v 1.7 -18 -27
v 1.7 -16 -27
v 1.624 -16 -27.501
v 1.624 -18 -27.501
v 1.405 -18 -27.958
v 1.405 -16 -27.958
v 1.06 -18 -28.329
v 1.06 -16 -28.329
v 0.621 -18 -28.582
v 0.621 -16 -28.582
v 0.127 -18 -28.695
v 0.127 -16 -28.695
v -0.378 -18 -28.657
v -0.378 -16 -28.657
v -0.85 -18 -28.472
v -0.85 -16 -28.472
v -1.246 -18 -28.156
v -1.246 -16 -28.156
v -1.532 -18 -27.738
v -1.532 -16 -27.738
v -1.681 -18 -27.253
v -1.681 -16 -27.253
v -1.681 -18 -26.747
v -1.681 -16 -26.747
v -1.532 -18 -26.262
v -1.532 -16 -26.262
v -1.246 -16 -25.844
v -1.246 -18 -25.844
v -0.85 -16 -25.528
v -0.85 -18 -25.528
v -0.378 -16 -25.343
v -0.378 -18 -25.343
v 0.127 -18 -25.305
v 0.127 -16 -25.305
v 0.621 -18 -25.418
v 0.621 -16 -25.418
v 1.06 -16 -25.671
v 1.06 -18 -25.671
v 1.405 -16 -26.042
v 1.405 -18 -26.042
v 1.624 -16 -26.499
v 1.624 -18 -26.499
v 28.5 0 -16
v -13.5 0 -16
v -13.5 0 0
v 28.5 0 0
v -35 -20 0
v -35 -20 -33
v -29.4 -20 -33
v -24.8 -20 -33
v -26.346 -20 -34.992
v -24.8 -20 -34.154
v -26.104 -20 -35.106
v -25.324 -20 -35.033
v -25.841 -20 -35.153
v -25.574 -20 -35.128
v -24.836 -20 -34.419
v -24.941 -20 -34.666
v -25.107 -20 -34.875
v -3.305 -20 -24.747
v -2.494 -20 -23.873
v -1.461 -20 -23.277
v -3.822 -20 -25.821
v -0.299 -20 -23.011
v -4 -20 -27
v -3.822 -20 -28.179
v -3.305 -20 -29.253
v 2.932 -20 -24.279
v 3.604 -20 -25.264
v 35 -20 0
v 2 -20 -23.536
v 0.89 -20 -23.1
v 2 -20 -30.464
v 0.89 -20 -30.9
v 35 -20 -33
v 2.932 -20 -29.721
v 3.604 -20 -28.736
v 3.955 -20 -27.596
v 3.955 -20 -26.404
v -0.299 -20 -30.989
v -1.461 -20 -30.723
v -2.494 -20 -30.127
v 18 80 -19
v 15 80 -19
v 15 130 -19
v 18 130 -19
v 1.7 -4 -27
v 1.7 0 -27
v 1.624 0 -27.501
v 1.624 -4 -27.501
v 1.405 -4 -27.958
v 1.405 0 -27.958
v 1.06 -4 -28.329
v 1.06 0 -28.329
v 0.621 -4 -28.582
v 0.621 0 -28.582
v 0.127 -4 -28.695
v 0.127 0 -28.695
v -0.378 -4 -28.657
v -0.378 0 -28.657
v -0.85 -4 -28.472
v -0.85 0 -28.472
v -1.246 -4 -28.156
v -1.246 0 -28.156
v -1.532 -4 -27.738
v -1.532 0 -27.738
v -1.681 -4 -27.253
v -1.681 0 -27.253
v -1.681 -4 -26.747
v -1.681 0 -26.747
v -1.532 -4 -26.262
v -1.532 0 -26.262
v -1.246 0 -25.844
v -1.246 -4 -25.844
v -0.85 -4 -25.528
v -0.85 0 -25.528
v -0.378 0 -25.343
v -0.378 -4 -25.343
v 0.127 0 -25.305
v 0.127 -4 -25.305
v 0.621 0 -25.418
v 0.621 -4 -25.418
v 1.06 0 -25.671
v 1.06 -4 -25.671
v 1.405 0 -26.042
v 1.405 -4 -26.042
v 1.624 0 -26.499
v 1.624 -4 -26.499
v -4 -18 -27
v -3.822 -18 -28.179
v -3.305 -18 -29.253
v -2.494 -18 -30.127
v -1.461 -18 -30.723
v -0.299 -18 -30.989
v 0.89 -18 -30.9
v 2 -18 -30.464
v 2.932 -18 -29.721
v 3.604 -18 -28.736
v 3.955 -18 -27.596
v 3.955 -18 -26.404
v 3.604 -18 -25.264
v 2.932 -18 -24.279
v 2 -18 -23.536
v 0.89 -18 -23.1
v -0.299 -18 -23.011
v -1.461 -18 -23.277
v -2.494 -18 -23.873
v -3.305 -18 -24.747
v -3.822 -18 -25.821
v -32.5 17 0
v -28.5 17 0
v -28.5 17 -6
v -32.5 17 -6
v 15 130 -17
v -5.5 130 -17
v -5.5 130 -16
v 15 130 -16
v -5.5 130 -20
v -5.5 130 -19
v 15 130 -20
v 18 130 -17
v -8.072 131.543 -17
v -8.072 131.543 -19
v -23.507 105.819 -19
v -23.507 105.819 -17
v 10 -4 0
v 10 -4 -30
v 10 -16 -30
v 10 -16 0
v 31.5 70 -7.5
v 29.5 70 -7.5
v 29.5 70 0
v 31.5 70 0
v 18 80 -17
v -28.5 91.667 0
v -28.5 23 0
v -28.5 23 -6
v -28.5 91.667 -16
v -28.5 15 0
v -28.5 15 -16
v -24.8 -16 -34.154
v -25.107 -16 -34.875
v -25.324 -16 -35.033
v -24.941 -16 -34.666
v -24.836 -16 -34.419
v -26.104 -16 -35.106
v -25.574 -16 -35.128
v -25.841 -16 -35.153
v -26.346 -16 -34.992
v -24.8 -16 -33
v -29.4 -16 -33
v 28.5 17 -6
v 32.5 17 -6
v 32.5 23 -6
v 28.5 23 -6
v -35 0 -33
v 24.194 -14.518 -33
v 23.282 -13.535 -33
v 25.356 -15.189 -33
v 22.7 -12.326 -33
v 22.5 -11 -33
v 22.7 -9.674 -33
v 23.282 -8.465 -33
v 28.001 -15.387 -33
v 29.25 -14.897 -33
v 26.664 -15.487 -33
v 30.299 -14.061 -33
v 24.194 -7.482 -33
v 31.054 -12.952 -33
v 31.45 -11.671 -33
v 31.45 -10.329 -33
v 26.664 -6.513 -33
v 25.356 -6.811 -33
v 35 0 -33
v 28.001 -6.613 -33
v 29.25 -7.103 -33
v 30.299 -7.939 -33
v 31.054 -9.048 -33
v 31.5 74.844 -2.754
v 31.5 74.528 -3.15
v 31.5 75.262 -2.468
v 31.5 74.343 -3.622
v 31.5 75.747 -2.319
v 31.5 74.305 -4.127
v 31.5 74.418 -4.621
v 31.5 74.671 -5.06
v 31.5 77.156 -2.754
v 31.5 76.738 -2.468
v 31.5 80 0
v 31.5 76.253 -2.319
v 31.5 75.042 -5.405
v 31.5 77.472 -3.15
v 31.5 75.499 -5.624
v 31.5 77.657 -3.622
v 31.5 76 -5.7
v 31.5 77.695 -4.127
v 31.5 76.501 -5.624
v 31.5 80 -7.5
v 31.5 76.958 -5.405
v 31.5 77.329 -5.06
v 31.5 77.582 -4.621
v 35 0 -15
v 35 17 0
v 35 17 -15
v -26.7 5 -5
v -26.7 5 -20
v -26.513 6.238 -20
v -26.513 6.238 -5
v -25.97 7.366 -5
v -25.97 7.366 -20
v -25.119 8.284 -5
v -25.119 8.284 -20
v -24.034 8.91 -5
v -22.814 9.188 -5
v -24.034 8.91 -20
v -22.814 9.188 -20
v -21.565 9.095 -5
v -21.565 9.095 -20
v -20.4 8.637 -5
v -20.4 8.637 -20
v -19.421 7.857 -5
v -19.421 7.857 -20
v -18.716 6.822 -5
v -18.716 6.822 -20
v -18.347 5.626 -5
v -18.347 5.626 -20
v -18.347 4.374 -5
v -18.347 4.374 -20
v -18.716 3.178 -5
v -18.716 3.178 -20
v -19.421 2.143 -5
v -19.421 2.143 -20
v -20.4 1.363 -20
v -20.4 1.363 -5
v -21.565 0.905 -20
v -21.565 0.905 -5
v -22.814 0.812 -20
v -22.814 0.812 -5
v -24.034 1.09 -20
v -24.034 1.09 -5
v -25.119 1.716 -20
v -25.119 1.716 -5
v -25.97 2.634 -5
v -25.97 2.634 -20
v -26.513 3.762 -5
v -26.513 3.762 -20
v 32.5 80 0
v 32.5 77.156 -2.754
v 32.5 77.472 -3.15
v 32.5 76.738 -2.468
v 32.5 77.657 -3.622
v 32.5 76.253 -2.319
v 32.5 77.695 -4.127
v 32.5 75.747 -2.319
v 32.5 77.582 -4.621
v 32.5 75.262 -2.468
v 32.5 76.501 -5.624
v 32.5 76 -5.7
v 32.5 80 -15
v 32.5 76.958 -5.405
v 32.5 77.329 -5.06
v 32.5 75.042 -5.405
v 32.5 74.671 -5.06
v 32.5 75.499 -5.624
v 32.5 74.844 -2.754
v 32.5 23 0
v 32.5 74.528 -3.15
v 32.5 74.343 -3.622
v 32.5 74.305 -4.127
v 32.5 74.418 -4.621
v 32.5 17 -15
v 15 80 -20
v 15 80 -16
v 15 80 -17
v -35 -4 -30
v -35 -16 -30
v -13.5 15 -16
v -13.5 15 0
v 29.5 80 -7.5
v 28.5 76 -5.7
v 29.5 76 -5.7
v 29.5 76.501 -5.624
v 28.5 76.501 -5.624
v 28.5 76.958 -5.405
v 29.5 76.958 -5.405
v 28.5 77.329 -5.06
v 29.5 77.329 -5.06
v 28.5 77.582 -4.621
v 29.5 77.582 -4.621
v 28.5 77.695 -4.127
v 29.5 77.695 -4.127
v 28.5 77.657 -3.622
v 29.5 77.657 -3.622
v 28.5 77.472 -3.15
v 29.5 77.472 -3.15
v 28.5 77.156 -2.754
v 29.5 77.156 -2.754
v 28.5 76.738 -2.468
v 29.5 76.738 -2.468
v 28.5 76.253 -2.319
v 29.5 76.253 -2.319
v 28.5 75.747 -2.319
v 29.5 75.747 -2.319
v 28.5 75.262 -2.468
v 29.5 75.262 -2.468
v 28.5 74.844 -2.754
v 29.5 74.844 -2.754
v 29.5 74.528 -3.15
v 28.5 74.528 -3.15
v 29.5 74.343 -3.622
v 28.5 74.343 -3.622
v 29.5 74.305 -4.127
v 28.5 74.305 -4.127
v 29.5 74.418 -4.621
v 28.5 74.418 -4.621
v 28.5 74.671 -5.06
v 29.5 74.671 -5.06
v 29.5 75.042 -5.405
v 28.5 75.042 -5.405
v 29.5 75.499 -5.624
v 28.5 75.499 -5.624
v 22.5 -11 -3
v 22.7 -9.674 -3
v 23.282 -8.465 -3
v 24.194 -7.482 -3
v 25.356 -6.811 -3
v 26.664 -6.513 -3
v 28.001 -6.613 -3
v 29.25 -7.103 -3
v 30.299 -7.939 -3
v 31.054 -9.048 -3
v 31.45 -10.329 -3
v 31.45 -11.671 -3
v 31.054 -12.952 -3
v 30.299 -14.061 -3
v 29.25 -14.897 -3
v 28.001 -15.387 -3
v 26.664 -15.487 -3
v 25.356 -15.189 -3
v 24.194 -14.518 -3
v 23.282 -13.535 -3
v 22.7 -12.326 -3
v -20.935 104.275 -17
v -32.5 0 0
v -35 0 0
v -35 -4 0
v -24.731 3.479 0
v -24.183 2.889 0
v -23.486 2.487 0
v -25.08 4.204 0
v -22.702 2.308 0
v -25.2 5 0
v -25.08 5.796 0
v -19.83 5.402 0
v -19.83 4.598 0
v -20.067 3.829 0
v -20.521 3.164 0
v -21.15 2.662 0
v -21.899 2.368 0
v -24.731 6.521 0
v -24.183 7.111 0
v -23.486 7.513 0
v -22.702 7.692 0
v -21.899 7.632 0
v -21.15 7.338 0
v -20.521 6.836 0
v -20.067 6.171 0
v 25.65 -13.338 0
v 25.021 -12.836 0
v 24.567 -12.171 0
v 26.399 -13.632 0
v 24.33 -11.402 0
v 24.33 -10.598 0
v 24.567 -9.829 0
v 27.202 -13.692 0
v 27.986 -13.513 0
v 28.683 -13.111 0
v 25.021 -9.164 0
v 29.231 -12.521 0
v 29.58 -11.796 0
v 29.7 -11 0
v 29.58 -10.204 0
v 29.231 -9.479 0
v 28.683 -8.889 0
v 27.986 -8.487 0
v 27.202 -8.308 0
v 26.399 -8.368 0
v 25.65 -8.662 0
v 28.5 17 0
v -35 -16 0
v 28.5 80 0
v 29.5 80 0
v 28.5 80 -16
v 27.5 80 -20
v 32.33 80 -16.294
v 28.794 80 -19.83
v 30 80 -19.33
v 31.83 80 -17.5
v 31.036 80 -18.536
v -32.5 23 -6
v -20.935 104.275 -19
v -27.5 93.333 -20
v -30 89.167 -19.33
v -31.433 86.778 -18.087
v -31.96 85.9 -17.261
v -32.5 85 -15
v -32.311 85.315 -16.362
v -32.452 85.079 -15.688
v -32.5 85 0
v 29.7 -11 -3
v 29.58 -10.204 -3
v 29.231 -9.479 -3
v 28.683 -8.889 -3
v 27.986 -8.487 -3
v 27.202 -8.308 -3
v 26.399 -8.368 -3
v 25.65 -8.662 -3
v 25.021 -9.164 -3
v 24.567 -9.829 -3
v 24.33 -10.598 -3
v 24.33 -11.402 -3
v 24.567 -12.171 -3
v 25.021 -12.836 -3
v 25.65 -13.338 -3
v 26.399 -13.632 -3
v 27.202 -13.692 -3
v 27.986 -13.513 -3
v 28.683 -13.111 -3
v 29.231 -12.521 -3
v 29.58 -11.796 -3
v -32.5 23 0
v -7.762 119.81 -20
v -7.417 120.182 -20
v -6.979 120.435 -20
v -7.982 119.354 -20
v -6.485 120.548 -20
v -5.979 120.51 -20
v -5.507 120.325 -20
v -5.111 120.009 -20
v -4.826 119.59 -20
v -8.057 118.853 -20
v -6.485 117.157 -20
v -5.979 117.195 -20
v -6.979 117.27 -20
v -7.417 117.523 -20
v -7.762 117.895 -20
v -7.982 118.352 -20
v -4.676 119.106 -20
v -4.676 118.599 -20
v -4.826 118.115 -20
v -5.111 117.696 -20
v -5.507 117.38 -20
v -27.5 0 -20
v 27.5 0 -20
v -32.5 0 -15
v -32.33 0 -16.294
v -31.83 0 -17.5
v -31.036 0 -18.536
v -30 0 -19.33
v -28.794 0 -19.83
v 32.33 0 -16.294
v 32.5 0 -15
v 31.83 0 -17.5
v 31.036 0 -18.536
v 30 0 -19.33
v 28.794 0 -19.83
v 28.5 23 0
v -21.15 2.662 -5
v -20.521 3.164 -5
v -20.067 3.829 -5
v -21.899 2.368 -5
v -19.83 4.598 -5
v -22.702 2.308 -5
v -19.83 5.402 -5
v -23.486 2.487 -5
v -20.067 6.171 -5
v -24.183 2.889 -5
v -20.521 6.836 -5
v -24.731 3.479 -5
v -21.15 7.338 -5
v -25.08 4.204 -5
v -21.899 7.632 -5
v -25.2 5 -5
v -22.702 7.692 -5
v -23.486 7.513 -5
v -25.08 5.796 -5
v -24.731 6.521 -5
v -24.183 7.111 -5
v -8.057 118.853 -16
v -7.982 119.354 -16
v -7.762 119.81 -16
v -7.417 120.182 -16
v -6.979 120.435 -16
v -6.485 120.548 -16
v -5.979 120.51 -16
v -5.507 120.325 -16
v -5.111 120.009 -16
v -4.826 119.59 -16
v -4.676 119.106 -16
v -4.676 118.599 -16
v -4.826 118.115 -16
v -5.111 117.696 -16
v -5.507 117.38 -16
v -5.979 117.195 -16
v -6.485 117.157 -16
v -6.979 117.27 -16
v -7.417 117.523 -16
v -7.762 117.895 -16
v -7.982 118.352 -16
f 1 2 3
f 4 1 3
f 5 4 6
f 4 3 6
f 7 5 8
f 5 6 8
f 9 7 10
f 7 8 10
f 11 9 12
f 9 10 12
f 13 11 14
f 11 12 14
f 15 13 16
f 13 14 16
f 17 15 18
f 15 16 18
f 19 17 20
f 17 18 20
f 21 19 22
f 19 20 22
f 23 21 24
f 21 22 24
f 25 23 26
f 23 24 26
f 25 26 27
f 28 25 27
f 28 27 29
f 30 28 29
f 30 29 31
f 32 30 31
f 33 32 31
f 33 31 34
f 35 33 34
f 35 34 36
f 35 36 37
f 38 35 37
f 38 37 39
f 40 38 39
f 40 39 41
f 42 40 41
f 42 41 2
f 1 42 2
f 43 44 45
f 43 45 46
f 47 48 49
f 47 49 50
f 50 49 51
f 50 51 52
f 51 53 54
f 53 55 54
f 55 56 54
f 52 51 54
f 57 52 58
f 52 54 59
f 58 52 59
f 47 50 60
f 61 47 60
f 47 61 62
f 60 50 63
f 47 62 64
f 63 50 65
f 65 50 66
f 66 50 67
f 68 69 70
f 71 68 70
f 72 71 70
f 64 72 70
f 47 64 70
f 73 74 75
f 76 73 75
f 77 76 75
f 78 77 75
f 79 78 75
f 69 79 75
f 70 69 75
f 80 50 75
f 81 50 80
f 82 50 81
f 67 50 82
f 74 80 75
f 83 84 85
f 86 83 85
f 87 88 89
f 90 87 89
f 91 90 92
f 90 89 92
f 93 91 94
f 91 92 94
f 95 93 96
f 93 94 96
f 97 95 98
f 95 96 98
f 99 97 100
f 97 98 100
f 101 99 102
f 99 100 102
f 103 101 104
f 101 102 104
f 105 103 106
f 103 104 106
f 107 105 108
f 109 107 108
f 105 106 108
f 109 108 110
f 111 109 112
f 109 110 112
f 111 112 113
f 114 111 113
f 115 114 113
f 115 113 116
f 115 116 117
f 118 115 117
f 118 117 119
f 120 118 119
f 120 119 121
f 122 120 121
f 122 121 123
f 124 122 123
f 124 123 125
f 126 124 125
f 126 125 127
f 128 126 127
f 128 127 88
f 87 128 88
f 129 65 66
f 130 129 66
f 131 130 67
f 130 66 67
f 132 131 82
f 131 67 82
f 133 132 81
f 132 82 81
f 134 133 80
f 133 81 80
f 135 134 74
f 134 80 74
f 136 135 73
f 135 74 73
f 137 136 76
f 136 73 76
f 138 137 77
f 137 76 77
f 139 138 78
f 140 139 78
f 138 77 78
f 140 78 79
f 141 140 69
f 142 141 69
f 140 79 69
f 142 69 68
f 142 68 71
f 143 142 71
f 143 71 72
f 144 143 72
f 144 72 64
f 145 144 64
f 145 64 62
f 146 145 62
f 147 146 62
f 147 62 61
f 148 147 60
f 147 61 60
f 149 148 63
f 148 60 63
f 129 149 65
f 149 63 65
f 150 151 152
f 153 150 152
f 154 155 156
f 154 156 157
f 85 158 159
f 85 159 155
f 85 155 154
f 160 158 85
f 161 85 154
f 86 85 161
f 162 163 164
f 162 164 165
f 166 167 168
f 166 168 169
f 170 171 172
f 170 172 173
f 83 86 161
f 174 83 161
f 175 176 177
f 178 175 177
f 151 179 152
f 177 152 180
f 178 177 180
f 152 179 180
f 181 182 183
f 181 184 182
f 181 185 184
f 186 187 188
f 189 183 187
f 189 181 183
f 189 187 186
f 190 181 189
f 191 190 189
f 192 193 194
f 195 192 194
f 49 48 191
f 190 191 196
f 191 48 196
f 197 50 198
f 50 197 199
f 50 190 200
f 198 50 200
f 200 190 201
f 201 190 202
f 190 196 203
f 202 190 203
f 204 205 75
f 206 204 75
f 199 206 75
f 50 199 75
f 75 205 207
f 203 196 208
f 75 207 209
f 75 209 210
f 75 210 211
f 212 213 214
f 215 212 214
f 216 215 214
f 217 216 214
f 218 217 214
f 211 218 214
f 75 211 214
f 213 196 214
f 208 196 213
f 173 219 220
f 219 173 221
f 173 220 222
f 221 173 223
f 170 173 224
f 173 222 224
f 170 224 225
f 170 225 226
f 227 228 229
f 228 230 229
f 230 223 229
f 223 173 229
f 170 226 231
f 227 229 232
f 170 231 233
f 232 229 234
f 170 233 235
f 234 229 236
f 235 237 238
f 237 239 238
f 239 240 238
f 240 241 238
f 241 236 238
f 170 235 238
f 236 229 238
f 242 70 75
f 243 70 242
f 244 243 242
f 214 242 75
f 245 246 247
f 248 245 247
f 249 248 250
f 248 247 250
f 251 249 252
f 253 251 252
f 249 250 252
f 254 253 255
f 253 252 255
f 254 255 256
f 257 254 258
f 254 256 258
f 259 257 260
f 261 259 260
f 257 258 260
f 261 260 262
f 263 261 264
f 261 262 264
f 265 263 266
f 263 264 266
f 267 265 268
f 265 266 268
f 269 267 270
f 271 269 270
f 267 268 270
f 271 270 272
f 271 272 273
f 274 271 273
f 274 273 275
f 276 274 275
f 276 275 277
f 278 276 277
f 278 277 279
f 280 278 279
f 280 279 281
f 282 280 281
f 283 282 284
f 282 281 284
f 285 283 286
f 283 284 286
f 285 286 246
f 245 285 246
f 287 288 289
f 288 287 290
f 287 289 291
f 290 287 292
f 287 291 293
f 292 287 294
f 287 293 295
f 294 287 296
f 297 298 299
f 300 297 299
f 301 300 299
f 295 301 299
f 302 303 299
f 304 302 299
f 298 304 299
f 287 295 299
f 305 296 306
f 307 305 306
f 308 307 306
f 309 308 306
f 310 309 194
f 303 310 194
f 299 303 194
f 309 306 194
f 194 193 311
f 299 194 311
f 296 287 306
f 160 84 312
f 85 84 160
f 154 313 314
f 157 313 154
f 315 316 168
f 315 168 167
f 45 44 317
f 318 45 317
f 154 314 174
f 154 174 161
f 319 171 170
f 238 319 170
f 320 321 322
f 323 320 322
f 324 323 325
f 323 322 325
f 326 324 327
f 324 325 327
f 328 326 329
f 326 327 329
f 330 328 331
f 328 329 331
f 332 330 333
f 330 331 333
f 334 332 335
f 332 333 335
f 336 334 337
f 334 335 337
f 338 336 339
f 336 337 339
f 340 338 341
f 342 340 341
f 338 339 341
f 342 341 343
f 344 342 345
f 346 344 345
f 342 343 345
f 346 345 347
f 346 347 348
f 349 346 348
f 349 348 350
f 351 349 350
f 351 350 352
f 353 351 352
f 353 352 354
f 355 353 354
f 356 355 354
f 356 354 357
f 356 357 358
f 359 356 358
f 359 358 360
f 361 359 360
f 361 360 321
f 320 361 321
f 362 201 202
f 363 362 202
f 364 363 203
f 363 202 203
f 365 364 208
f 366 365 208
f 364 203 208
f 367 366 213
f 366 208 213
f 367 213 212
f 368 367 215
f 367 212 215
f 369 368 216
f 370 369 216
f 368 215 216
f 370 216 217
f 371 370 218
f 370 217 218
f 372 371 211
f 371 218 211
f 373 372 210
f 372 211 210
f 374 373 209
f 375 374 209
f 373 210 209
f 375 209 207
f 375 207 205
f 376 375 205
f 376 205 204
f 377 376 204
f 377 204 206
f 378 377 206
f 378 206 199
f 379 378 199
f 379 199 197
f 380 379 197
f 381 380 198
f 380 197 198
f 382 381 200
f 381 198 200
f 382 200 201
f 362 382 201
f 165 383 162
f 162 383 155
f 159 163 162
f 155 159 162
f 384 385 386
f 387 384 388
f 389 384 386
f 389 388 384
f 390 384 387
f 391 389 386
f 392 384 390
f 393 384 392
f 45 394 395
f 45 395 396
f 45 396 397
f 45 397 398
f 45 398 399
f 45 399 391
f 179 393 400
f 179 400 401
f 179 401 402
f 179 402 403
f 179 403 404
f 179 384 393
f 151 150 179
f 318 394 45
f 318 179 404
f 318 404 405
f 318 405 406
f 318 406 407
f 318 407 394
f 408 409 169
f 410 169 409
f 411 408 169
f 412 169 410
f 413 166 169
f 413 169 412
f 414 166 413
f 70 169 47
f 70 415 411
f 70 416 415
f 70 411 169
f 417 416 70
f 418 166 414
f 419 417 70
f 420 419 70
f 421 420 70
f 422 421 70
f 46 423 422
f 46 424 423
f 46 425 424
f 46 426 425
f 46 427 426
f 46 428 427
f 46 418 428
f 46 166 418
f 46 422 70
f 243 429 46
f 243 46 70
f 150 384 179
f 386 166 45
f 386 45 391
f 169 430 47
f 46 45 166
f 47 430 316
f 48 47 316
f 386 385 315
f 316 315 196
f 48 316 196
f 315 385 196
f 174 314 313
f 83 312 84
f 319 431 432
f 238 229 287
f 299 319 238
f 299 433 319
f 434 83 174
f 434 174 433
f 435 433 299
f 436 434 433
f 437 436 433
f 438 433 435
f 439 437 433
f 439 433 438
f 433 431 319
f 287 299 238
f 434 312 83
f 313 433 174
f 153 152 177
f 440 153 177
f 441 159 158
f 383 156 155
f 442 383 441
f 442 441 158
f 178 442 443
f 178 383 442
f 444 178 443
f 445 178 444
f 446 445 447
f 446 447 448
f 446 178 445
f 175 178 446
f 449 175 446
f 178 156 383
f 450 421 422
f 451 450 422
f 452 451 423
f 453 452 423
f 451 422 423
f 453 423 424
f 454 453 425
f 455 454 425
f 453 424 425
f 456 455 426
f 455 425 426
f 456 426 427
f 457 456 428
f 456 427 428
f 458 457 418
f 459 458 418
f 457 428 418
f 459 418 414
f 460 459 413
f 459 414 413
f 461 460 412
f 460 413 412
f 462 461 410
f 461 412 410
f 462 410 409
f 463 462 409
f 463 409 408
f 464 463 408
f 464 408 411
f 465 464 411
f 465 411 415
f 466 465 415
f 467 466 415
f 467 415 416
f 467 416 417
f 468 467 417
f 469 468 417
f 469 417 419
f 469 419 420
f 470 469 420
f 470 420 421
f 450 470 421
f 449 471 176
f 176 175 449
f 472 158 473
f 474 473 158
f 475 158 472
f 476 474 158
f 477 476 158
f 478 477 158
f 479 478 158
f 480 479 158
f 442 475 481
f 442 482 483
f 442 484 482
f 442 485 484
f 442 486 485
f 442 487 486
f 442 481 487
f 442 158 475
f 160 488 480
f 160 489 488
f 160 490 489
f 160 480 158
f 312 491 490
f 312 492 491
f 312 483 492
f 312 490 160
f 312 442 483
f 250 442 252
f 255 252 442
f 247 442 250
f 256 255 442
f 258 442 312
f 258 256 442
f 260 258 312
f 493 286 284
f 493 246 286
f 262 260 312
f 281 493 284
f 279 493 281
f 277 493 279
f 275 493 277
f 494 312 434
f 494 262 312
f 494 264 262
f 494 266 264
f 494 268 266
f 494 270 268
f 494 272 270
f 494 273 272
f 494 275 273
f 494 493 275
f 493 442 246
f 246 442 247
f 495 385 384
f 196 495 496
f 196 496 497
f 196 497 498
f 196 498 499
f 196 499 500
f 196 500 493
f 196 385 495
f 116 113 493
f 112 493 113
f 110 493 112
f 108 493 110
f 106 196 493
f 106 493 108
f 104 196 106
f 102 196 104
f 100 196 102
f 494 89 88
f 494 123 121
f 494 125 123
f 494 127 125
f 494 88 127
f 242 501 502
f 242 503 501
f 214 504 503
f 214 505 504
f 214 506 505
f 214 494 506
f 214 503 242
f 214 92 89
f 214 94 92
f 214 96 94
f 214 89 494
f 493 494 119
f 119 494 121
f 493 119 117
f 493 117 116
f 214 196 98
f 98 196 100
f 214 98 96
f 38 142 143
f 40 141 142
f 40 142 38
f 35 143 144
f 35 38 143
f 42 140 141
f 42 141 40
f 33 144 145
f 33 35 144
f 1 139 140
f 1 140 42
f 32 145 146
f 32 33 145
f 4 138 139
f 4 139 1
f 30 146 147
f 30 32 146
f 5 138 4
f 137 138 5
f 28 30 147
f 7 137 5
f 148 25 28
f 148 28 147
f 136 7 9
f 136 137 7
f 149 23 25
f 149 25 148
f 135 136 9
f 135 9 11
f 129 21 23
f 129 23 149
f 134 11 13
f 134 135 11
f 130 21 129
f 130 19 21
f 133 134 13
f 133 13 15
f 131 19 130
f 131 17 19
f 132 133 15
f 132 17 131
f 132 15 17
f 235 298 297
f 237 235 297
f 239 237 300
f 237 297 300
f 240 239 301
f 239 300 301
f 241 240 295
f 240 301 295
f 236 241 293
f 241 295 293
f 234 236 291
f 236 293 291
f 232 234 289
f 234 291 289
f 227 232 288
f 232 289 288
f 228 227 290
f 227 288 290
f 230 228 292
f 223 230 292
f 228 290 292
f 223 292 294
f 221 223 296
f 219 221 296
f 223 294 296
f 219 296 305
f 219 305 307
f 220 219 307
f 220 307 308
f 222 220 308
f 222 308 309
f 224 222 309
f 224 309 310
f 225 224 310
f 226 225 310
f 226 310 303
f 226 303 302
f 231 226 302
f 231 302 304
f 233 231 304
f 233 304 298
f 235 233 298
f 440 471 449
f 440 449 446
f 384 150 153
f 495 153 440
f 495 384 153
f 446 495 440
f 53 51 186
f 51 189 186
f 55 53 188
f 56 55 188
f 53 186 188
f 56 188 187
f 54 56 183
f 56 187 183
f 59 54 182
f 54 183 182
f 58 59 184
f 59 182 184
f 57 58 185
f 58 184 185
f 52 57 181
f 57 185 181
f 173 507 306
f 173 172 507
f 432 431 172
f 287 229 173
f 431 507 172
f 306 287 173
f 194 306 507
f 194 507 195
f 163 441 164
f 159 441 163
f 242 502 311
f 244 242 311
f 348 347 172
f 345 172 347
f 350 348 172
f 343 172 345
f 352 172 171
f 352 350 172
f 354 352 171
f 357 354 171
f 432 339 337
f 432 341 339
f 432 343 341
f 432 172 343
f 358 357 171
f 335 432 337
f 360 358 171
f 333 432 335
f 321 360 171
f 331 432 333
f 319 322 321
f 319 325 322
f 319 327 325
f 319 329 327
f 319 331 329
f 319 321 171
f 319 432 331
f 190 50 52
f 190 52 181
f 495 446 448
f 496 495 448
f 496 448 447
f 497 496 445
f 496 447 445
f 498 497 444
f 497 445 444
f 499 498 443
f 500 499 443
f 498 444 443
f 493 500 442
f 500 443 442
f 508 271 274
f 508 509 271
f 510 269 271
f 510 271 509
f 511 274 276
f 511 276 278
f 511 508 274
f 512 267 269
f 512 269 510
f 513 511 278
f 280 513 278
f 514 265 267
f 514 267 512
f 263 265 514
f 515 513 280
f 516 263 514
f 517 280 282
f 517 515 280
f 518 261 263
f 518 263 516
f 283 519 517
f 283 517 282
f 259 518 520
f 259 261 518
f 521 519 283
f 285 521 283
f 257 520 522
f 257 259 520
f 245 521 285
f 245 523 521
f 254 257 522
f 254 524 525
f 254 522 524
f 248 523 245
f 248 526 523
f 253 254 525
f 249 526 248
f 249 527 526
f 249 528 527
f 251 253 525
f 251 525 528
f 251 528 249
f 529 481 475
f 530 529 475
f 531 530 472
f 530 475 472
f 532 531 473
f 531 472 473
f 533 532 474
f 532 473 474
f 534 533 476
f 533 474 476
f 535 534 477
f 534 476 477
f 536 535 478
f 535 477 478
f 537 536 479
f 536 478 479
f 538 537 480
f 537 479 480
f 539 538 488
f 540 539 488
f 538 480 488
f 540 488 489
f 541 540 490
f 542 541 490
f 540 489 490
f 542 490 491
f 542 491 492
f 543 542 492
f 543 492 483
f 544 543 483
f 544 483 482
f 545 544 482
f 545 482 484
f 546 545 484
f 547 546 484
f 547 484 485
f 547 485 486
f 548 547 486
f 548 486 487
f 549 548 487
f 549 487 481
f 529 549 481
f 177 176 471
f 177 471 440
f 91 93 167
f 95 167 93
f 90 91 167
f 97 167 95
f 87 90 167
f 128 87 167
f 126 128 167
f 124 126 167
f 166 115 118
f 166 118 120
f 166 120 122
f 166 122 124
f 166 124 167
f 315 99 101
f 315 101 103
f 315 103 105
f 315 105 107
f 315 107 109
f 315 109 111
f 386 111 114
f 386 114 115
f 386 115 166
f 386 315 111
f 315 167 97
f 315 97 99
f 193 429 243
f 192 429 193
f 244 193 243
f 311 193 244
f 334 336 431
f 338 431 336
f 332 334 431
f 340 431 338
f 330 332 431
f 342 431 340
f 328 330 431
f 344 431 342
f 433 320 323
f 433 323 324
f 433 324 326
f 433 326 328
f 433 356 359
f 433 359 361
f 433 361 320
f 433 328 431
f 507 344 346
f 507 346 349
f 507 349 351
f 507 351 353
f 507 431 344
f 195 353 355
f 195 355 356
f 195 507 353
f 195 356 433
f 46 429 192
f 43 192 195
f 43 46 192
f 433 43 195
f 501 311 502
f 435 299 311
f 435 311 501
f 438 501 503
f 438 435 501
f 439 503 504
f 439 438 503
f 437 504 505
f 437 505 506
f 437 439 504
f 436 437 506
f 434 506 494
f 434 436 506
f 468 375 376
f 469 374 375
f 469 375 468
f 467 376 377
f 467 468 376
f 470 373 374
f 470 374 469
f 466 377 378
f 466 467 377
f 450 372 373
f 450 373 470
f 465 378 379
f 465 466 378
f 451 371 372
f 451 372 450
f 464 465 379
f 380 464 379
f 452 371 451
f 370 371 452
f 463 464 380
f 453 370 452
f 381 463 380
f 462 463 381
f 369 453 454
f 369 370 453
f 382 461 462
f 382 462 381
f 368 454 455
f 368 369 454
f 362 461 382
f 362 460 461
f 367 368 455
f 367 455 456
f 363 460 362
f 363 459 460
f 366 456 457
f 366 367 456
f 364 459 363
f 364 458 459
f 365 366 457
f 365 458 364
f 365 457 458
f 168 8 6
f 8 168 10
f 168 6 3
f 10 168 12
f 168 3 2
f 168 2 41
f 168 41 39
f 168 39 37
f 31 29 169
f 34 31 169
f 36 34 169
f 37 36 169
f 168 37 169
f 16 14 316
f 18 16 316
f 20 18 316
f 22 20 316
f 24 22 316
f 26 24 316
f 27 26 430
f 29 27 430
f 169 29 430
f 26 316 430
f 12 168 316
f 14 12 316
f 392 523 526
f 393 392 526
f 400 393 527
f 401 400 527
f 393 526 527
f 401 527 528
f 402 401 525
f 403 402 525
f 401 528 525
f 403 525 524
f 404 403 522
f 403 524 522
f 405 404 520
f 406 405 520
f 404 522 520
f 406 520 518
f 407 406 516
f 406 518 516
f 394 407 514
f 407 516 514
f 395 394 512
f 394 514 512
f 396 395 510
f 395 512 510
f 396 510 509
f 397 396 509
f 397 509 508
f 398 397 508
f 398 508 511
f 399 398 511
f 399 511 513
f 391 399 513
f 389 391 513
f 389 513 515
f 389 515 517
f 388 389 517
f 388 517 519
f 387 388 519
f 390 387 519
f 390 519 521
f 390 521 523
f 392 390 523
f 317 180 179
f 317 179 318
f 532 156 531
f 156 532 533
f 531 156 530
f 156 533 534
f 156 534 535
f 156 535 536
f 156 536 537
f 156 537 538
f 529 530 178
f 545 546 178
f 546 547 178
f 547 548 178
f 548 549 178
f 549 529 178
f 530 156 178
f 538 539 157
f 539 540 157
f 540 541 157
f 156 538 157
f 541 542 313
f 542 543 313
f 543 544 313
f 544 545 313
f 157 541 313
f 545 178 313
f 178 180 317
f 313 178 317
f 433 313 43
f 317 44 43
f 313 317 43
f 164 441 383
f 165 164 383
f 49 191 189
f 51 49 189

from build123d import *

# Parameters (mm, degrees)
SKETCH1_W                = 65
SKETCH1_H                = 40
BOSS_EXTRUDE1_DEPTH      = 130
SHELL1_T                 = -4
FILLET1_R                = 5
CUT_EXTRUDE1_DEPTH       = 21
CUT_EXTRUDE1_DEPTH_BACK  = 21
SKETCH3_W                = 17.5
SKETCH3_H                = 50
CUT_EXTRUDE2_DEPTH       = 21
CUT_EXTRUDE2_DEPTH_BACK  = 21
SKETCH5_W                = 2
SKETCH5_H                = 50
BOSS_EXTRUDE2_DEPTH      = 3
SKETCH6_W                = 2
SKETCH6_H                = 30
BOSS_EXTRUDE3_DEPTH      = 3
SKETCH8_W                = 70
SKETCH8_H                = 66
BOSS_EXTRUDE4_DEPTH      = 20
SKETCH10_W               = 60
SKETCH10_H               = 12
CUT_EXTRUDE4_DEPTH       = 45
SKETCH23_W               = 2
SKETCH23_H               = 15
CUT_EXTRUDE10_DEPTH      = 10
SKETCH27_W               = 70
SKETCH27_H               = 33
CUT_EXTRUDE12_DEPTH      = 132.543487266
CUT_EXTRUDE12_DEPTH_BACK = 21
SKETCH31_R               = 2.7
CUT_EXTRUDE15_DEPTH      = 1
CUT_EXTRUDE15_DEPTH_BACK = 34
SKETCH33_R               = 4.5
CUT_EXTRUDE16_DEPTH      = 30
SKETCH34_R               = 1.7
CUT_EXTRUDE17_DEPTH      = 132.543487266
CUT_EXTRUDE17_DEPTH_BACK = 21
SKETCH35_R               = 4
CUT_EXTRUDE18_DEPTH      = 2
SKETCH41_W               = 6
SKETCH41_H               = 6
CUT_EXTRUDE21_DEPTH      = 3.5
CUT_EXTRUDE21_DEPTH_BACK = 68.5
SKETCH42_W               = 15
SKETCH42_H               = 17
BOSS_EXTRUDE10_DEPTH     = 2.5
SKETCH43_R               = 1.7
CUT_EXTRUDE22_DEPTH      = 3.5
CUT_EXTRUDE22_DEPTH_BACK = 10
SKETCH45_W               = 4.6
SKETCH45_H               = 4
BOSS_EXTRUDE11_DEPTH     = 3
CUT_EXTRUDE23_DEPTH      = 5
FILLET2_R                = 1
SKETCH49_R               = 1.7
CUT_EXTRUDE24_DEPTH      = 16.153953894
CUT_EXTRUDE24_DEPTH_BACK = 21
SKETCH50_W               = 15
SKETCH50_H               = 15
BOSS_EXTRUDE12_DEPTH     = 16
SKETCH52_R               = 4.2
CUT_EXTRUDE25_DEPTH      = 15
SKETCH53_R               = 2.7
CUT_EXTRUDE26_DEPTH      = 31.153953894
CUT_EXTRUDE26_DEPTH_BACK = 6


with BuildPart() as part:
    # Sketch1 → Boss-Extrude1 (new body)
    with BuildSketch(Plane(origin=(0, 0, 0), x_dir=(1, 0, 0), z_dir=(0, 1, 0))):
        Rectangle(SKETCH1_W, SKETCH1_H)
    extrude(amount=BOSS_EXTRUDE1_DEPTH)

    # Shell1
    shell1_openings = [part.faces().sort_by_distance(p)[0] for p in [
        (0, 130, 0),
        (0, 0, 0),
    ]]
    offset(amount=SHELL1_T, openings=shell1_openings, kind=Kind.INTERSECTION)

    # Fillet1
    fillet1_edges = [part.edges().sort_by_distance(p)[0] for p in [
        (32.5, 65, 20),
        (-32.5, 65, 20),
        (-32.5, 65, -20),
        (32.5, 65, -20),
    ]]
    fillet(fillet1_edges, radius=FILLET1_R)

    # Sketch2 → Cut-Extrude1 (cut, two sides)
    with BuildSketch(Plane.XY) as cut_extrude1_sk:
        Polygon((-5.5, 130), (-32.5, 85), (-32.5, 130), align=None)
    extrude(amount=CUT_EXTRUDE1_DEPTH, mode=Mode.SUBTRACT)
    extrude(cut_extrude1_sk.sketch, amount=-CUT_EXTRUDE1_DEPTH_BACK, mode=Mode.SUBTRACT)

    # Sketch3 → Cut-Extrude2 (cut, two sides)
    with BuildSketch(Plane.XY) as cut_extrude2_sk:
        with Locations((23.75, 105)):
            Rectangle(SKETCH3_W, SKETCH3_H)
    extrude(amount=CUT_EXTRUDE2_DEPTH, mode=Mode.SUBTRACT)
    extrude(cut_extrude2_sk.sketch, amount=-CUT_EXTRUDE2_DEPTH_BACK, mode=Mode.SUBTRACT)

    # Sketch5 → Boss-Extrude2 (add)
    with BuildSketch(Plane(origin=(15, 0, 0), x_dir=(0, 0, -1), z_dir=(1, 0, 0))):
        with Locations((-18, 105)):
            Rectangle(SKETCH5_W, SKETCH5_H)
    boss_extrude2 = extrude(amount=BOSS_EXTRUDE2_DEPTH)

    # Mirror1: Boss-Extrude2 across plane
    add(boss_extrude2.mirror(Plane.XY))

    # Sketch6 → Boss-Extrude3 (add)
    with BuildSketch(Plane(origin=(-61.397058824, 36.838235294, 0), x_dir=(0, 0, 1), z_dir=(-0.857492926, 0.514495755, 0))):
        with Locations((-18, 93.644353688)):
            Rectangle(SKETCH6_W, SKETCH6_H)
    boss_extrude3 = extrude(amount=BOSS_EXTRUDE3_DEPTH)

    # Mirror2: Boss-Extrude3 across plane
    add(boss_extrude3.mirror(Plane.XY))

    # Sketch8 → Boss-Extrude4 (add)
    with BuildSketch(Plane(origin=(0, 0, 0), x_dir=(1, 0, 0), z_dir=(0, 1, 0))):
        Rectangle(SKETCH8_W, SKETCH8_H)
    extrude(amount=-BOSS_EXTRUDE4_DEPTH)

    # Sketch10 → Cut-Extrude4 (cut)
    with BuildSketch(Plane.ZY.offset(35)):
        with Locations((0, -10)):
            Rectangle(SKETCH10_W, SKETCH10_H)
    extrude(amount=-CUT_EXTRUDE4_DEPTH, mode=Mode.SUBTRACT)

    # Sketch23 → Cut-Extrude10 (cut)
    with BuildSketch(Plane(origin=(0, 80, 0), x_dir=(1, 0, 0), z_dir=(0, 1, 0))):
        with Locations((30.5, 0)):
            Rectangle(SKETCH23_W, SKETCH23_H)
    extrude(amount=-CUT_EXTRUDE10_DEPTH, mode=Mode.SUBTRACT)

    # Sketch27 → Cut-Extrude12 (cut, two sides)
    with BuildSketch(Plane(origin=(0, 0, 0), x_dir=(1, 0, 0), z_dir=(0, 1, 0))) as cut_extrude12_sk:
        with Locations((0, -16.5)):
            Rectangle(SKETCH27_W, SKETCH27_H)
    extrude(amount=CUT_EXTRUDE12_DEPTH, mode=Mode.SUBTRACT)
    extrude(cut_extrude12_sk.sketch, amount=-CUT_EXTRUDE12_DEPTH_BACK, mode=Mode.SUBTRACT)

    # Sketch31 → Cut-Extrude15 (cut, two sides)
    with BuildSketch(Plane.XY) as cut_extrude15_sk:
        with Locations((27, -11)):
            Circle(SKETCH31_R)
    extrude(amount=CUT_EXTRUDE15_DEPTH, mode=Mode.SUBTRACT)
    extrude(cut_extrude15_sk.sketch, amount=-CUT_EXTRUDE15_DEPTH_BACK, mode=Mode.SUBTRACT)

    # Sketch33 → Cut-Extrude16 (cut)
    with BuildSketch(Plane(origin=(0, 0, -33), x_dir=(-1, 0, 0), z_dir=(0, 0, -1))):
        with Locations((-27, -11)):
            Circle(SKETCH33_R)
    extrude(amount=-CUT_EXTRUDE16_DEPTH, mode=Mode.SUBTRACT)

    # Sketch34 → Cut-Extrude17 (cut, two sides)
    with BuildSketch(Plane(origin=(0, 0, 0), x_dir=(1, 0, 0), z_dir=(0, 1, 0))) as cut_extrude17_sk:
        with Locations((0, 27)):
            Circle(SKETCH34_R)
    extrude(amount=CUT_EXTRUDE17_DEPTH, mode=Mode.SUBTRACT)
    extrude(cut_extrude17_sk.sketch, amount=-CUT_EXTRUDE17_DEPTH_BACK, mode=Mode.SUBTRACT)

    # Sketch35 → Cut-Extrude18 (cut)
    with BuildSketch(Plane(origin=(0, -20, 0), x_dir=(-1, 0, 0), z_dir=(0, -1, 0))):
        with Locations((0, 27)):
            Circle(SKETCH35_R)
    extrude(amount=-CUT_EXTRUDE18_DEPTH, mode=Mode.SUBTRACT)

    # Sketch41 → Cut-Extrude21 (cut, two sides)
    with BuildSketch(Plane(origin=(32.5, 0, 0), x_dir=(0, 0, -1), z_dir=(1, 0, 0))) as cut_extrude21_sk:
        with Locations((3, 20)):
            Rectangle(SKETCH41_W, SKETCH41_H)
    extrude(amount=CUT_EXTRUDE21_DEPTH, mode=Mode.SUBTRACT)
    extrude(cut_extrude21_sk.sketch, amount=-CUT_EXTRUDE21_DEPTH_BACK, mode=Mode.SUBTRACT)

    # Sketch42 → Boss-Extrude10 (add)
    with BuildSketch(Plane(origin=(32.5, 0, 0), x_dir=(0, 0, -1), z_dir=(1, 0, 0))):
        with Locations((7.5, 8.5)):
            Rectangle(SKETCH42_W, SKETCH42_H)
    extrude(amount=BOSS_EXTRUDE10_DEPTH)

    # Sketch43 → Cut-Extrude22 (cut, two sides)
    with BuildSketch(Plane(origin=(32.5, 0, 0), x_dir=(0, 0, -1), z_dir=(1, 0, 0))) as cut_extrude22_sk:
        with Locations((4, 76)):
            Circle(SKETCH43_R)
    extrude(amount=CUT_EXTRUDE22_DEPTH, mode=Mode.SUBTRACT)
    extrude(cut_extrude22_sk.sketch, amount=-CUT_EXTRUDE22_DEPTH_BACK, mode=Mode.SUBTRACT)

    # Sketch45 → Boss-Extrude11 (add)
    with BuildSketch(Plane(origin=(0, 0, -33), x_dir=(-1, 0, 0), z_dir=(0, 0, -1))):
        with Locations((27.1, -18)):
            Rectangle(SKETCH45_W, SKETCH45_H)
    extrude(amount=BOSS_EXTRUDE11_DEPTH)

    # Sketch46 → Cut-Extrude23 (cut, through all)
    with BuildSketch(Plane(origin=(0, -16, 0), x_dir=(1, 0, 0), z_dir=(0, 1, 0))):
        Polygon((-29.4, 33), (-24.8, 36), (-29.4, 36), align=None)
    extrude(amount=-CUT_EXTRUDE23_DEPTH, mode=Mode.SUBTRACT)

    # Fillet2
    fillet2_edges = [part.edges().sort_by_distance(p)[0] for p in [
        (-24.8, -18, -36),
    ]]
    fillet(fillet2_edges, radius=FILLET2_R)

    # Sketch49 → Cut-Extrude24 (cut, two sides)
    with BuildSketch(Plane(origin=(0, 0, -20), x_dir=(-1, 0, 0), z_dir=(0, 0, -1))) as cut_extrude24_sk:
        with Locations((6.357492926, 118.852591966)):
            Circle(SKETCH49_R)
    extrude(amount=CUT_EXTRUDE24_DEPTH, mode=Mode.SUBTRACT)
    extrude(cut_extrude24_sk.sketch, amount=-CUT_EXTRUDE24_DEPTH_BACK, mode=Mode.SUBTRACT)

    # Sketch50 → Boss-Extrude12 (add)
    with BuildSketch(Plane.XY.offset(-16)):
        with Locations((-21, 7.5)):
            Rectangle(SKETCH50_W, SKETCH50_H)
    extrude(amount=BOSS_EXTRUDE12_DEPTH)

    # Sketch52 → Cut-Extrude25 (cut)
    with BuildSketch(Plane(origin=(0, 0, -20), x_dir=(-1, 0, 0), z_dir=(0, 0, -1))):
        with Locations((22.5, 5)):
            Circle(SKETCH52_R)
    extrude(amount=-CUT_EXTRUDE25_DEPTH, mode=Mode.SUBTRACT)

    # Sketch53 → Cut-Extrude26 (cut, two sides)
    with BuildSketch(Plane(origin=(0, 0, -5), x_dir=(-1, 0, 0), z_dir=(0, 0, -1))) as cut_extrude26_sk:
        with Locations((22.5, 5)):
            Circle(SKETCH53_R)
    extrude(amount=CUT_EXTRUDE26_DEPTH, mode=Mode.SUBTRACT)
    extrude(cut_extrude26_sk.sketch, amount=-CUT_EXTRUDE26_DEPTH_BACK, mode=Mode.SUBTRACT)


solid = part.part
